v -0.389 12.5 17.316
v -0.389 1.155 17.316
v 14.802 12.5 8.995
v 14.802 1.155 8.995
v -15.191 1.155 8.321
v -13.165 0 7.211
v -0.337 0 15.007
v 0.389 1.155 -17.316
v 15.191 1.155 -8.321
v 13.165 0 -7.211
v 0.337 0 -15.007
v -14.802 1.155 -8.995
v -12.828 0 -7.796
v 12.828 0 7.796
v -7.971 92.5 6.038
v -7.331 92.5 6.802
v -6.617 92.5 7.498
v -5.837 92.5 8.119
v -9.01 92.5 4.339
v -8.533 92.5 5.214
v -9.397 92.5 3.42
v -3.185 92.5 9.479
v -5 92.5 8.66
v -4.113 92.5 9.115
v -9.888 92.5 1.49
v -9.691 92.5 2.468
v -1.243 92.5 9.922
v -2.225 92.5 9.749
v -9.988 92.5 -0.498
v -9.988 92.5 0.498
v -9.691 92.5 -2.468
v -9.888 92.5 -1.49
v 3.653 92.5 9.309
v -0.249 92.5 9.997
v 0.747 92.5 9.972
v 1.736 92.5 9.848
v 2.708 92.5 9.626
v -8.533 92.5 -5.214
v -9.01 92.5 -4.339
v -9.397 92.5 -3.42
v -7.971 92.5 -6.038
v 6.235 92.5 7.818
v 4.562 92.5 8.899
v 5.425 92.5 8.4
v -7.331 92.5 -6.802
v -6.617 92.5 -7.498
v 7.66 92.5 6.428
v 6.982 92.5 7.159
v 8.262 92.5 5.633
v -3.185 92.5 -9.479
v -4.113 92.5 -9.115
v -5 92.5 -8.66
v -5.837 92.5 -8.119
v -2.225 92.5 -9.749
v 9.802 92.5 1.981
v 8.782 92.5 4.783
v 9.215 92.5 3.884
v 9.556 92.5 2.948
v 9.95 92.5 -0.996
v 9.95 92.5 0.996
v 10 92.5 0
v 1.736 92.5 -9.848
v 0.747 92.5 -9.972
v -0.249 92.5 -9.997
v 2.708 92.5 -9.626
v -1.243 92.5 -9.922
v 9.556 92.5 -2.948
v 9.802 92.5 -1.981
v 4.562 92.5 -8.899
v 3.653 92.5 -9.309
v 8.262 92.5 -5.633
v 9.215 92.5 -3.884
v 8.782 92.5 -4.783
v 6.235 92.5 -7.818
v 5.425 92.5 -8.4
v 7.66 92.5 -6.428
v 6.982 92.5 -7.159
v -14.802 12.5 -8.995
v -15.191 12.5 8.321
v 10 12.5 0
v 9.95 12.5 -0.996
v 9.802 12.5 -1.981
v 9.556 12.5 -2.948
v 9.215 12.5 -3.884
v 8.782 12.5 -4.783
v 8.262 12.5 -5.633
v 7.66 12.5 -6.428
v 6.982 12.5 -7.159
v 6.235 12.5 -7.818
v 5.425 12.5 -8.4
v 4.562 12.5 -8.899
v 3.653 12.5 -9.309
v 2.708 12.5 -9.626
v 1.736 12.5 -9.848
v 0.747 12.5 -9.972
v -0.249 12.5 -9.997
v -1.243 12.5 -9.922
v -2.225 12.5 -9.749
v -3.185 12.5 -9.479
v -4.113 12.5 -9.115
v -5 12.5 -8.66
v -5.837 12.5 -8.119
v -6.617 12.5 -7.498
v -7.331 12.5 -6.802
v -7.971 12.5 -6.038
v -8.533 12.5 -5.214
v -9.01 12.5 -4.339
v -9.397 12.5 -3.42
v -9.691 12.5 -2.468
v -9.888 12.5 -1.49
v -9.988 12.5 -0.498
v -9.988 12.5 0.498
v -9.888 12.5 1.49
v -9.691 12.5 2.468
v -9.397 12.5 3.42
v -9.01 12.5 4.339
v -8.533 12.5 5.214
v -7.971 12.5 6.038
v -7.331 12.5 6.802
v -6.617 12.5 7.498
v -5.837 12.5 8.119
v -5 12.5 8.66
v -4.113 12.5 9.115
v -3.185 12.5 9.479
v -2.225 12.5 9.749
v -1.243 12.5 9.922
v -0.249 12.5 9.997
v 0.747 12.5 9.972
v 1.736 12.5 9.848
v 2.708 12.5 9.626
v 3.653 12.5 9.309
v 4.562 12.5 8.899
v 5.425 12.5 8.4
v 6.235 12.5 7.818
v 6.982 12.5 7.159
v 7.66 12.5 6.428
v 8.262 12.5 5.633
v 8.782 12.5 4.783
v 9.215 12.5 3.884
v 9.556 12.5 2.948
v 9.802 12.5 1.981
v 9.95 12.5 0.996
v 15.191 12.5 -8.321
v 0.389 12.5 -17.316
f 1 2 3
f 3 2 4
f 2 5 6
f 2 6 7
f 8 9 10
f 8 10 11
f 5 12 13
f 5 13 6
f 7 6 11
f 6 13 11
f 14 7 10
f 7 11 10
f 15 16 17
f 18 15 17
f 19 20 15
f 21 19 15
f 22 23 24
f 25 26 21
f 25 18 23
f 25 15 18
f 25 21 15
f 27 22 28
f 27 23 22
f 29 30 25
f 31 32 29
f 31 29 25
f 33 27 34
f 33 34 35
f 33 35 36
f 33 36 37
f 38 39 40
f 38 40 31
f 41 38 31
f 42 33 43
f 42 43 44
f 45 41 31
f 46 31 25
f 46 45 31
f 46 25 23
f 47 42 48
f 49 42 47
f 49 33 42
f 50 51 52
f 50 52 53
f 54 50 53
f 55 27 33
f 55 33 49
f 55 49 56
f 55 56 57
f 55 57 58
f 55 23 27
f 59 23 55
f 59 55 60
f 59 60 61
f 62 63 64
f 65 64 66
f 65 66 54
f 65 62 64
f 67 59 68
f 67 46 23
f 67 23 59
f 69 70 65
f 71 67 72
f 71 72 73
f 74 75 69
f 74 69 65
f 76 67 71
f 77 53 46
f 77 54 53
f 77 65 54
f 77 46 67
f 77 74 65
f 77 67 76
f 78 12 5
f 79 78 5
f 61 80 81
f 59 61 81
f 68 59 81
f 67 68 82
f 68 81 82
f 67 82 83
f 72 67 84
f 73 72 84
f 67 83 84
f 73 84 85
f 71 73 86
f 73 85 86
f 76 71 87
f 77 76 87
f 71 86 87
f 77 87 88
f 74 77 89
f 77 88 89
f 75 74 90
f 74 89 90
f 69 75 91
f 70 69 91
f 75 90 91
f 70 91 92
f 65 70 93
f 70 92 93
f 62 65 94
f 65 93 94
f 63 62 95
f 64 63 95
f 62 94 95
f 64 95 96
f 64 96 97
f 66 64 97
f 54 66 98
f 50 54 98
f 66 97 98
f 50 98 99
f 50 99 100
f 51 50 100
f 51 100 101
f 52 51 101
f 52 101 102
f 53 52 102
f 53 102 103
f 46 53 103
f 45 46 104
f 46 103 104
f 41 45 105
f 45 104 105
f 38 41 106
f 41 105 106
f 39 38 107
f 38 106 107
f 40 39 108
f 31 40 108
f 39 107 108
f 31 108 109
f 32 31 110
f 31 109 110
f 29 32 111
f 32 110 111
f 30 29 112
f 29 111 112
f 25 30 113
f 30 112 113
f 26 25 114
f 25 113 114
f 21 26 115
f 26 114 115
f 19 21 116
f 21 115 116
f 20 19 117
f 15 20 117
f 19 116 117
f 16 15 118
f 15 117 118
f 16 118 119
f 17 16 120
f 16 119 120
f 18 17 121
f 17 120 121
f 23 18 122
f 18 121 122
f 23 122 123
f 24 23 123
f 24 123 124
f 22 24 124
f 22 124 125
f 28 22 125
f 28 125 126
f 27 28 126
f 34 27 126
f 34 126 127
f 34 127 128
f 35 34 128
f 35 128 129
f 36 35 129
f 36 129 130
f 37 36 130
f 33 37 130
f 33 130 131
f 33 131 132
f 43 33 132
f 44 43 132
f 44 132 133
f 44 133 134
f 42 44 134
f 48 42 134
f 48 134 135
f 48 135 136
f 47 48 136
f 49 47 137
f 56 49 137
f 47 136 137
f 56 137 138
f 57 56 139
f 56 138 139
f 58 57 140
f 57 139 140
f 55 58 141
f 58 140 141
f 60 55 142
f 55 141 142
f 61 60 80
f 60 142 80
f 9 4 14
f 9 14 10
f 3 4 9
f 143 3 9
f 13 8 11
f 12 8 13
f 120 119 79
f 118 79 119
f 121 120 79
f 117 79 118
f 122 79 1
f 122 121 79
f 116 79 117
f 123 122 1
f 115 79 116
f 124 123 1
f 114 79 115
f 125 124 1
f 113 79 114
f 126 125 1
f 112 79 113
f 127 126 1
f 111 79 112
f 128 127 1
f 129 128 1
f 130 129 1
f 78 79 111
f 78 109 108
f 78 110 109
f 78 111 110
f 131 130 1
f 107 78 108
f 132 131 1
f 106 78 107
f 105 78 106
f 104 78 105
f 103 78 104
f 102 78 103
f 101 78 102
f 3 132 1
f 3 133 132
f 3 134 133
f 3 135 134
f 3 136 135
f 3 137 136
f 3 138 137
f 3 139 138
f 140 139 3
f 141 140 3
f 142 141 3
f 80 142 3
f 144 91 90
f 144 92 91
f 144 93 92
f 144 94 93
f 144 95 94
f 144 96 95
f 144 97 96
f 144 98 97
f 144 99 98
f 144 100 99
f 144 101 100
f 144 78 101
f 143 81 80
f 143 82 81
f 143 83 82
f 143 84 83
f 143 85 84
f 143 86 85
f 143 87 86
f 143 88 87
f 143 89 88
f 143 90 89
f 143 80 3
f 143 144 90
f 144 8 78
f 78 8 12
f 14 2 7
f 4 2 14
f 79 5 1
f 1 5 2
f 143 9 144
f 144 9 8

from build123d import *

# Parameters (mm, degrees)
EXTRUDE_1_DEPTH = 12.5
SKETCH_2_R      = 10
EXTRUDE_2_DEPTH = 80
CHAMFER_1_SIZE  = 2
CHAMFER_1_SIZE2 = 1.154700538


with BuildPart() as part:
    # Эскиз1 → Бобышка-Вытянуть1 (new body)
    with BuildSketch(Plane(origin=(0, 0, 0), x_dir=(1, 0, 0), z_dir=(0, 1, 0))):
        Polygon((14.801582536, -8.995173953), (15.190840422, 8.320959516), (0.389257887, 17.316133468), (-14.801582536, 8.995173953), (-15.190840422, -8.320959516), (-0.389257887, -17.316133468), align=None)
    extrude(amount=EXTRUDE_1_DEPTH)

    # Эскиз2 → Бобышка-Вытянуть2 (add)
    with BuildSketch(Plane(origin=(0, 12.5, 0), x_dir=(1, 0, 0), z_dir=(0, 1, 0))):
        Circle(SKETCH_2_R)
    extrude(amount=EXTRUDE_2_DEPTH)

    # Фаска1
    chamfer_1_edges = [part.edges().sort_by_distance(p)[0] for p in [
        (-7.790049154, 0, 12.818546492),
        (-14.996211479, 0, -0.337107218),
        (-7.206162325, 0, -13.155653711),
        (7.790049154, 0, -12.818546492),
        (14.996211479, 0, 0.337107218),
        (7.206162325, 0, 13.155653711),
    ]]
    chamfer_1_side = [part.faces().sort_by_distance(p)[0] for p in [
        (0, 0, 0),
    ]]
    chamfer(chamfer_1_edges, length=CHAMFER_1_SIZE, length2=CHAMFER_1_SIZE2, reference=chamfer_1_side[0])


solid = part.part
